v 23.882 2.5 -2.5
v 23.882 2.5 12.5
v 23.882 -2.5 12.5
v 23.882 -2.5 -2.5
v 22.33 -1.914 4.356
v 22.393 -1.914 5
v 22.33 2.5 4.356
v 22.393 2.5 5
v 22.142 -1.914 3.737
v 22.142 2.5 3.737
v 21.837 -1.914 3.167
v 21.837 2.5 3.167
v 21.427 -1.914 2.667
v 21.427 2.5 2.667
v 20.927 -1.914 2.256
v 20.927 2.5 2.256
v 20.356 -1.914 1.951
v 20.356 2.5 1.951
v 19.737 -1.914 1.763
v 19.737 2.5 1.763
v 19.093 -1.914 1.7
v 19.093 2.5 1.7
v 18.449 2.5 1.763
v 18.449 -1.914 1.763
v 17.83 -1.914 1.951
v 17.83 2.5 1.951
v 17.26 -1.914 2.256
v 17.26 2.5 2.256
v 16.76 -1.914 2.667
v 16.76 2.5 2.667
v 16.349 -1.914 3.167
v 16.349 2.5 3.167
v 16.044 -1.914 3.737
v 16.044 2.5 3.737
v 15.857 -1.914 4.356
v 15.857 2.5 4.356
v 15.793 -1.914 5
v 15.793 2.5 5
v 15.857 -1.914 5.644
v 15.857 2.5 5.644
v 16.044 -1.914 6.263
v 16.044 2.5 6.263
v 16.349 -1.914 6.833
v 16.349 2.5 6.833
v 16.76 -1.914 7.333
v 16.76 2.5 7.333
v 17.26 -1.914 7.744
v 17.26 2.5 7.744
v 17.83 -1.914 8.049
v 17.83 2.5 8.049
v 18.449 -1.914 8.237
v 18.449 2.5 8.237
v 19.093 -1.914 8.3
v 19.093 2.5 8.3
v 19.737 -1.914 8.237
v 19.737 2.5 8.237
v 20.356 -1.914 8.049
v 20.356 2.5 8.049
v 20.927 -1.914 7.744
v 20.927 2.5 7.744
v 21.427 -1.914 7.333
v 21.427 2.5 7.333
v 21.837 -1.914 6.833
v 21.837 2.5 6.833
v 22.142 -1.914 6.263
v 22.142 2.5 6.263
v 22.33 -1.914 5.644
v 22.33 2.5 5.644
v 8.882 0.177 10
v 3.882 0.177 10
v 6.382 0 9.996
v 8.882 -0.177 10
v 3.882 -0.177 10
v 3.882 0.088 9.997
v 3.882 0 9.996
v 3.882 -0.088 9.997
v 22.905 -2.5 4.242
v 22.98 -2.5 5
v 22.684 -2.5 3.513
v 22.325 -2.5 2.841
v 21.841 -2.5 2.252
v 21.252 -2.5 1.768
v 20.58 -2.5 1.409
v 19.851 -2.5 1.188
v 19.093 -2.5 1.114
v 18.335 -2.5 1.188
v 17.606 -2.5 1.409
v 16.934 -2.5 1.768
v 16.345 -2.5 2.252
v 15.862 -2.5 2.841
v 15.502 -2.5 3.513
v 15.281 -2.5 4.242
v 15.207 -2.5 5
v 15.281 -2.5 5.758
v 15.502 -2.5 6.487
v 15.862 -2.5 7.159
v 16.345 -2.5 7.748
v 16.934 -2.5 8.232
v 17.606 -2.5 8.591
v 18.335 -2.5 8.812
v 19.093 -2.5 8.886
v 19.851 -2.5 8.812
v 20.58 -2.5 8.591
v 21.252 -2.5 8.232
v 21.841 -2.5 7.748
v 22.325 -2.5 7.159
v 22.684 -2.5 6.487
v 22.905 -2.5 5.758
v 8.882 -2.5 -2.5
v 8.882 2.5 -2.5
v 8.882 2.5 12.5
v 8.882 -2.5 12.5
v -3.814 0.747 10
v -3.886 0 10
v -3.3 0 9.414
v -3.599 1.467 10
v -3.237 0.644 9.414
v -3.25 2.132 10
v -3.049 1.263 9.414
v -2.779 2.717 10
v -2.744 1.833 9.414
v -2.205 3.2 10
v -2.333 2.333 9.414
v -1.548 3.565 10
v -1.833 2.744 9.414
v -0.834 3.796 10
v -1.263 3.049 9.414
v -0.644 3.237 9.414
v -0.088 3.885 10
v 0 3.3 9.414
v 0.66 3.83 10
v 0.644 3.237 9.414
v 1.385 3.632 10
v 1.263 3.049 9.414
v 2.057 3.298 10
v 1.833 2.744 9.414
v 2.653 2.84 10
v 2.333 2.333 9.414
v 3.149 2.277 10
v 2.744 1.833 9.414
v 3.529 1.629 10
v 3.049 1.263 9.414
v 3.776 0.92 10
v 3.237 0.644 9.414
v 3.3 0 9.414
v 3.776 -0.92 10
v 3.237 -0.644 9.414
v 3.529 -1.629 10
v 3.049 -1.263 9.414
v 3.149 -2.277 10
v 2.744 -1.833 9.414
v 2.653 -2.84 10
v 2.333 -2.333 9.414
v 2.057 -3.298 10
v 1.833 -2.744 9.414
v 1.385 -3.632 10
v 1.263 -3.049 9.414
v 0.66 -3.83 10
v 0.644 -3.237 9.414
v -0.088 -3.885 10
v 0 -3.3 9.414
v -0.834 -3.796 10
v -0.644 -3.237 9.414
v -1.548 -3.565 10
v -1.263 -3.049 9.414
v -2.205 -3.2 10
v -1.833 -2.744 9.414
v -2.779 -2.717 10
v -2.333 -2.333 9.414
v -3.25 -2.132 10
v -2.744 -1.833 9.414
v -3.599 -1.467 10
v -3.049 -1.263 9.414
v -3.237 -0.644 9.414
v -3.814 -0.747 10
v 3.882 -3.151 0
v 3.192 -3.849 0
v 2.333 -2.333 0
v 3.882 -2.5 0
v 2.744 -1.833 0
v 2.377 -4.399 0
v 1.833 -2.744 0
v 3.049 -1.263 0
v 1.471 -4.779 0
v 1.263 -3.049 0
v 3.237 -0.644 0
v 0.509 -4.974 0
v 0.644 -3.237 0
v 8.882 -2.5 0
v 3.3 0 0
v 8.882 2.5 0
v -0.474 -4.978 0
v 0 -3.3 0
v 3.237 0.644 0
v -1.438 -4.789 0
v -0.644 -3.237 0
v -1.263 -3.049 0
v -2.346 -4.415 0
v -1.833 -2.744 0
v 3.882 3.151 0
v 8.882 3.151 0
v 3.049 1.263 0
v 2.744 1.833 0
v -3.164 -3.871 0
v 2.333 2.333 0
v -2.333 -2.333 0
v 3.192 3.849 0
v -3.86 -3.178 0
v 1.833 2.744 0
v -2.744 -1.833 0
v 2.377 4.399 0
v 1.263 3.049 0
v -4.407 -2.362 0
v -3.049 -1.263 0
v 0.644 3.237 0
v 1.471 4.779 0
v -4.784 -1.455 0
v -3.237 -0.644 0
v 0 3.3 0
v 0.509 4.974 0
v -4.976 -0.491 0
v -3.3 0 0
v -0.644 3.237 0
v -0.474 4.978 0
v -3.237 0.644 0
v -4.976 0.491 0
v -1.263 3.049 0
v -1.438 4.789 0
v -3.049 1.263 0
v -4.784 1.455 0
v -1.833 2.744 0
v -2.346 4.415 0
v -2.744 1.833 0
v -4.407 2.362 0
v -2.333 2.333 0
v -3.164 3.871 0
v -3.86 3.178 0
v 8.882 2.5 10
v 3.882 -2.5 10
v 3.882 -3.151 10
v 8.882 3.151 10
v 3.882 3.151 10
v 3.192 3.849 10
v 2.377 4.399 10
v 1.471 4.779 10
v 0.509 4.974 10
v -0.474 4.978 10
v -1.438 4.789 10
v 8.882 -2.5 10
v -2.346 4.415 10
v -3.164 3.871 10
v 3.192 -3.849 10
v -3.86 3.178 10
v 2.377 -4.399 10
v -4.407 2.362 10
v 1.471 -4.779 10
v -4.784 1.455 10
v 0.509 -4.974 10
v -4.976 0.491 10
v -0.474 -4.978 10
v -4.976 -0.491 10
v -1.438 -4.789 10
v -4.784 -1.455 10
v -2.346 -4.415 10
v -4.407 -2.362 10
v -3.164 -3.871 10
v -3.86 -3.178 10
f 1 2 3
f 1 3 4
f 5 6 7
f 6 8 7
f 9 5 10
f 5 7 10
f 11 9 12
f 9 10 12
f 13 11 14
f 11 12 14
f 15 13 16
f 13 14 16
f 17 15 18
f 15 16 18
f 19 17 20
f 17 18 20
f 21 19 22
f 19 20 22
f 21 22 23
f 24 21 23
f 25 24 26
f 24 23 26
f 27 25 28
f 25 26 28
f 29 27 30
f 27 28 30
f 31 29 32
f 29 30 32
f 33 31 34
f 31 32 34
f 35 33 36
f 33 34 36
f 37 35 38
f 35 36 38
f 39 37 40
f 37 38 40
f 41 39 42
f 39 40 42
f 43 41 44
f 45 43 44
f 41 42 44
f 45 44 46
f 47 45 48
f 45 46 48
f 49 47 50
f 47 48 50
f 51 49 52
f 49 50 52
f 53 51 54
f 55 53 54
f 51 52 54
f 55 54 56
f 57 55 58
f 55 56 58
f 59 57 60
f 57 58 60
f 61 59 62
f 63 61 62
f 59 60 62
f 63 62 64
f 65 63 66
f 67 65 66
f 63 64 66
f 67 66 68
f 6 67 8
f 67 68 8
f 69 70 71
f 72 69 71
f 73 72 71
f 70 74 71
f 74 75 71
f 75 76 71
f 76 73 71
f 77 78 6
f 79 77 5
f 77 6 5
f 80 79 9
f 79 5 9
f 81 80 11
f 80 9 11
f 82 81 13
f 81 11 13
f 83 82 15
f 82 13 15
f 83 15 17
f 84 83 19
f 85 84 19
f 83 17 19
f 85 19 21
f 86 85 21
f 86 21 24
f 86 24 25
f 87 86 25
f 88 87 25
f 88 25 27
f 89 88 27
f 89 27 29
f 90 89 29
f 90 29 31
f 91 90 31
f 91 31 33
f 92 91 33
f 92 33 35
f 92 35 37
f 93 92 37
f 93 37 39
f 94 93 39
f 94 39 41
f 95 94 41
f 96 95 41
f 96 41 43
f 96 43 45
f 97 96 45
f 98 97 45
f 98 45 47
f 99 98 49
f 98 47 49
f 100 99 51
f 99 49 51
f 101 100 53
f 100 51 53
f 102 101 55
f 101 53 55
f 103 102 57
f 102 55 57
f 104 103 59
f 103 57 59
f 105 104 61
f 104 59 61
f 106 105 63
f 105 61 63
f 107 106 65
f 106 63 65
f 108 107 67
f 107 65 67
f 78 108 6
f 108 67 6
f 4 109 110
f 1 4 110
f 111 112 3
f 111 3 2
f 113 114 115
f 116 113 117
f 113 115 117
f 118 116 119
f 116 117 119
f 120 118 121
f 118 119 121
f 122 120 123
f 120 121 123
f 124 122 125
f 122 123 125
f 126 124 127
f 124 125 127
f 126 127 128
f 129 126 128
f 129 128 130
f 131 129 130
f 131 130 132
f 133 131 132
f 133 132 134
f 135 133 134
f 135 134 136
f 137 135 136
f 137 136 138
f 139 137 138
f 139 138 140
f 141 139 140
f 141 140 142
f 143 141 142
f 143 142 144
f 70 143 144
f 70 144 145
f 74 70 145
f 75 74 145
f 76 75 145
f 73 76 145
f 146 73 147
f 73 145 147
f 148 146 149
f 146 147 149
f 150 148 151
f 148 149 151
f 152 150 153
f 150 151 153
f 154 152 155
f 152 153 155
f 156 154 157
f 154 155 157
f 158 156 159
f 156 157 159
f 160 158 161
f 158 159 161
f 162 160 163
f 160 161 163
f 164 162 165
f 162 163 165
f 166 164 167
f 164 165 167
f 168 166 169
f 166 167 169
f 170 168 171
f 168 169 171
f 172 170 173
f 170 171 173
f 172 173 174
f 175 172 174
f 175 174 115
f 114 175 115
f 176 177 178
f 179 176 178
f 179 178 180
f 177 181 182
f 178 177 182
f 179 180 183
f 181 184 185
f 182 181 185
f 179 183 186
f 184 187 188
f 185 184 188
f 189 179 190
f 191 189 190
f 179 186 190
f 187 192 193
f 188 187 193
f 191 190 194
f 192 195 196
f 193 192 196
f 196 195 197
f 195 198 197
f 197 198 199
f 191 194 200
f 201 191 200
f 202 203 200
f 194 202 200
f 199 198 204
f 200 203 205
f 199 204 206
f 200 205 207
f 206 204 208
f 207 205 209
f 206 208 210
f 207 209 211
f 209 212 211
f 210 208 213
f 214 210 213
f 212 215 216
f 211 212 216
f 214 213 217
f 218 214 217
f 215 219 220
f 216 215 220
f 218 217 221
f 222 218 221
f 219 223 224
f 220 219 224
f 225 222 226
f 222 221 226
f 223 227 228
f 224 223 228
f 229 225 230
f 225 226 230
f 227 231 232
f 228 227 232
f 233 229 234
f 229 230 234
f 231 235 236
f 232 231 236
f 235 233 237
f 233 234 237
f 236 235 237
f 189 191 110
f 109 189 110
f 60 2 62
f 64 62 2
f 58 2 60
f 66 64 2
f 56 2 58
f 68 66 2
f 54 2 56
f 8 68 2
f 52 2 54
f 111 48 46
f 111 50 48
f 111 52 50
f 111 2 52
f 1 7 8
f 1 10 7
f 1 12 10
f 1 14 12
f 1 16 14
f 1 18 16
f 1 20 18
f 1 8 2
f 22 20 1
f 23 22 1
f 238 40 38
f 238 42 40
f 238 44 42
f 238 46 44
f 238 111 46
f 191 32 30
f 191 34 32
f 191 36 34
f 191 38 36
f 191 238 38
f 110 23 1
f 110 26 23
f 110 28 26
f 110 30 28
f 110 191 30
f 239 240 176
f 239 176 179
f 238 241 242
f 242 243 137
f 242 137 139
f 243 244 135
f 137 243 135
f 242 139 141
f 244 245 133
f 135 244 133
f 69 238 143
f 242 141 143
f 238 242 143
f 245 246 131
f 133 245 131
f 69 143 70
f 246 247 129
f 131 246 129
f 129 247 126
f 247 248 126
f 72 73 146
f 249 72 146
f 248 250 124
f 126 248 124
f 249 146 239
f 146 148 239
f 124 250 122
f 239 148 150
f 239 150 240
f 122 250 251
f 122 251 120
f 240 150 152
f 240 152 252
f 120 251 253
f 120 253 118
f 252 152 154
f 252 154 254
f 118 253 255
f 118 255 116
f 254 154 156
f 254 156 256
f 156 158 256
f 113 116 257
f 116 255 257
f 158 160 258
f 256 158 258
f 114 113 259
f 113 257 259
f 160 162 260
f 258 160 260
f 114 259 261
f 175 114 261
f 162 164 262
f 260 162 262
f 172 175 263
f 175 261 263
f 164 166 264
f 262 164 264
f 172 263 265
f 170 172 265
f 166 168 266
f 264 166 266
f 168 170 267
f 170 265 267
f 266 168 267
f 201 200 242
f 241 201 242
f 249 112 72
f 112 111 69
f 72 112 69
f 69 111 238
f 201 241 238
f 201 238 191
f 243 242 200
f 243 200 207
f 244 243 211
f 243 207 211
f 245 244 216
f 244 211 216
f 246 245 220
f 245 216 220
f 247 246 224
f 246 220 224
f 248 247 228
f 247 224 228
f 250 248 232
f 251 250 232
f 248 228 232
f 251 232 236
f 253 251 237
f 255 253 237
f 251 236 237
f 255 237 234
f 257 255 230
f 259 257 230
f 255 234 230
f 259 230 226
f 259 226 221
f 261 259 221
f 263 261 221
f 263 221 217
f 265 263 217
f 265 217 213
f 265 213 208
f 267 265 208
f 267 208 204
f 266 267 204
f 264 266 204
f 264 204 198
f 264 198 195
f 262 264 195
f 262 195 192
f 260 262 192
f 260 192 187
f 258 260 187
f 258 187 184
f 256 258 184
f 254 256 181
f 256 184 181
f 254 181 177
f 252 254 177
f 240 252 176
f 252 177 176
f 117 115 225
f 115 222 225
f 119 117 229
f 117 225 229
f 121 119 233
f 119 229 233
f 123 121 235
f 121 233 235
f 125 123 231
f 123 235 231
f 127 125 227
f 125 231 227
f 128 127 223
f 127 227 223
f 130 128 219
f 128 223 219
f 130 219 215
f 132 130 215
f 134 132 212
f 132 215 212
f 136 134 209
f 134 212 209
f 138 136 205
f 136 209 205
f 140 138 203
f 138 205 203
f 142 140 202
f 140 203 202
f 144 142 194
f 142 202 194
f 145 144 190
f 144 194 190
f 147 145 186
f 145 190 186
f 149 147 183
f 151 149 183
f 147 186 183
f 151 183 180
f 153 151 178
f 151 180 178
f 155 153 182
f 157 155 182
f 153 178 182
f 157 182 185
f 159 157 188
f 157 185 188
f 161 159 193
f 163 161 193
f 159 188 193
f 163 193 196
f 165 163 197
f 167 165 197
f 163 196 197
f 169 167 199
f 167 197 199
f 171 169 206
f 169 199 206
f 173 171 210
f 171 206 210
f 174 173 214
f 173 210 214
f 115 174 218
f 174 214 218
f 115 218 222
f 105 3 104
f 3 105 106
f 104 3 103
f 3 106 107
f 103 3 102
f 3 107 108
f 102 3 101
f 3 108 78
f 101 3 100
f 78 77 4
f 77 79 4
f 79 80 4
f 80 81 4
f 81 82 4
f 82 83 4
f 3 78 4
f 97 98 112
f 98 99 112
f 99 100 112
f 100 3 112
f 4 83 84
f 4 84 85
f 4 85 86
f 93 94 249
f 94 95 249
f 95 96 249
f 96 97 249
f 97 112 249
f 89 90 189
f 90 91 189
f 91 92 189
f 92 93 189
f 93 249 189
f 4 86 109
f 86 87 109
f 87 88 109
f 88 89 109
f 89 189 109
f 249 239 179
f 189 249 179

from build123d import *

# Parameters (mm, degrees)
SKETCH_1_R                      = 5
EXTRUDE_1_DEPTH                 = 10
HOLE_WIZARD_G1_16_1_D           = 6.6
HOLE_WIZARD_G1_16_1_DEPTH       = 50
HOLE_WIZARD_G1_16_1_CSINK_D     = 7.773
HOLE_WIZARD_G1_16_1_CSINK_ANGLE = 90
HOLE_WIZARD_G1_16_1_TIP         = 1.982840043
SKETCH_4_W                      = 1.792487356
SKETCH_4_H                      = 9.243284927
CUT_EXTRUDE_1_DEPTH             = 10
EXTRUDE_2_DEPTH                 = 5
SKETCH_6_W                      = 15
SKETCH_6_H                      = 5
EXTRUDE_3_DEPTH                 = 15
HOLE_WIZARD_G1_16_2_D           = 6.6
HOLE_WIZARD_G1_16_2_DEPTH       = 50
HOLE_WIZARD_G1_16_2_CSINK_D     = 7.773
HOLE_WIZARD_G1_16_2_CSINK_ANGLE = 90
HOLE_WIZARD_G1_16_2_TIP         = 1.982840043


with BuildPart() as part:
    # 草图1 → 凸台-拉伸1 (new body)
    with BuildSketch(Plane.XY):
        Circle(SKETCH_1_R)
    extrude(amount=EXTRUDE_1_DEPTH)

    # G1/16 螺纹孔1
    with Locations(Plane.XY.offset(10)):
        with Locations((0, 0)):
            CounterSinkHole(HOLE_WIZARD_G1_16_1_D / 2, HOLE_WIZARD_G1_16_1_CSINK_D / 2, depth=HOLE_WIZARD_G1_16_1_DEPTH, counter_sink_angle=HOLE_WIZARD_G1_16_1_CSINK_ANGLE)
            with Locations((0, 0, -(HOLE_WIZARD_G1_16_1_DEPTH + HOLE_WIZARD_G1_16_1_TIP / 2))):  # 118° drill point
                Cone(0, HOLE_WIZARD_G1_16_1_D / 2, HOLE_WIZARD_G1_16_1_TIP, mode=Mode.SUBTRACT)

    # 草图4 → 切除-拉伸1 (cut)
    with BuildSketch(Plane.XY.offset(10)):
        with Locations((4.778713525, -1.471019051)):
            Rectangle(SKETCH_4_W, SKETCH_4_H)
    extrude(amount=-CUT_EXTRUDE_1_DEPTH, mode=Mode.SUBTRACT)

    # 草图5 → 凸台-拉伸2 (add)
    with BuildSketch(Plane(origin=(3.882469847, 0, 0), x_dir=(0, 0, -1), z_dir=(1, 0, 0))):
        with BuildLine():
            Line((-10, -0.176946718), (-10, -2.5))
            Line((-10, -2.5), (0, -2.5))
            Line((0, -2.5), (0, 3.150623413))
            Line((0, 3.150623413), (-10, 3.150623413))
            Line((-10, 3.150623413), (-10, 0.176946718))
            add(Edge.make_bspline(
                [(-10, 0.176946718), (-9.991943872, 0), (-10, -0.176946718)],
                knots=[-0.045560049, -0.045560049, -0.045560049, 0.045560049, 0.045560049, 0.045560049], degree=2, weights=[1, 1.001038039, 1]))
        make_face()
    extrude(amount=EXTRUDE_2_DEPTH)

    # 草图6 → 凸台-拉伸3 (add)
    with BuildSketch(Plane(origin=(8.882469847, 0, 0), x_dir=(0, 0, -1), z_dir=(1, 0, 0))):
        with Locations((-5, 0)):
            Rectangle(SKETCH_6_W, SKETCH_6_H)
    extrude(amount=EXTRUDE_3_DEPTH)

    # G1/16 螺纹孔2
    with Locations(Plane(origin=(0, -2.5, 0), x_dir=(-1, 0, 0), z_dir=(0, -1, 0))):
        with Locations((-19.093145461, -5)):
            CounterSinkHole(HOLE_WIZARD_G1_16_2_D / 2, HOLE_WIZARD_G1_16_2_CSINK_D / 2, depth=HOLE_WIZARD_G1_16_2_DEPTH, counter_sink_angle=HOLE_WIZARD_G1_16_2_CSINK_ANGLE)
            with Locations((0, 0, -(HOLE_WIZARD_G1_16_2_DEPTH + HOLE_WIZARD_G1_16_2_TIP / 2))):  # 118° drill point
                Cone(0, HOLE_WIZARD_G1_16_2_D / 2, HOLE_WIZARD_G1_16_2_TIP, mode=Mode.SUBTRACT)


solid = part.part
